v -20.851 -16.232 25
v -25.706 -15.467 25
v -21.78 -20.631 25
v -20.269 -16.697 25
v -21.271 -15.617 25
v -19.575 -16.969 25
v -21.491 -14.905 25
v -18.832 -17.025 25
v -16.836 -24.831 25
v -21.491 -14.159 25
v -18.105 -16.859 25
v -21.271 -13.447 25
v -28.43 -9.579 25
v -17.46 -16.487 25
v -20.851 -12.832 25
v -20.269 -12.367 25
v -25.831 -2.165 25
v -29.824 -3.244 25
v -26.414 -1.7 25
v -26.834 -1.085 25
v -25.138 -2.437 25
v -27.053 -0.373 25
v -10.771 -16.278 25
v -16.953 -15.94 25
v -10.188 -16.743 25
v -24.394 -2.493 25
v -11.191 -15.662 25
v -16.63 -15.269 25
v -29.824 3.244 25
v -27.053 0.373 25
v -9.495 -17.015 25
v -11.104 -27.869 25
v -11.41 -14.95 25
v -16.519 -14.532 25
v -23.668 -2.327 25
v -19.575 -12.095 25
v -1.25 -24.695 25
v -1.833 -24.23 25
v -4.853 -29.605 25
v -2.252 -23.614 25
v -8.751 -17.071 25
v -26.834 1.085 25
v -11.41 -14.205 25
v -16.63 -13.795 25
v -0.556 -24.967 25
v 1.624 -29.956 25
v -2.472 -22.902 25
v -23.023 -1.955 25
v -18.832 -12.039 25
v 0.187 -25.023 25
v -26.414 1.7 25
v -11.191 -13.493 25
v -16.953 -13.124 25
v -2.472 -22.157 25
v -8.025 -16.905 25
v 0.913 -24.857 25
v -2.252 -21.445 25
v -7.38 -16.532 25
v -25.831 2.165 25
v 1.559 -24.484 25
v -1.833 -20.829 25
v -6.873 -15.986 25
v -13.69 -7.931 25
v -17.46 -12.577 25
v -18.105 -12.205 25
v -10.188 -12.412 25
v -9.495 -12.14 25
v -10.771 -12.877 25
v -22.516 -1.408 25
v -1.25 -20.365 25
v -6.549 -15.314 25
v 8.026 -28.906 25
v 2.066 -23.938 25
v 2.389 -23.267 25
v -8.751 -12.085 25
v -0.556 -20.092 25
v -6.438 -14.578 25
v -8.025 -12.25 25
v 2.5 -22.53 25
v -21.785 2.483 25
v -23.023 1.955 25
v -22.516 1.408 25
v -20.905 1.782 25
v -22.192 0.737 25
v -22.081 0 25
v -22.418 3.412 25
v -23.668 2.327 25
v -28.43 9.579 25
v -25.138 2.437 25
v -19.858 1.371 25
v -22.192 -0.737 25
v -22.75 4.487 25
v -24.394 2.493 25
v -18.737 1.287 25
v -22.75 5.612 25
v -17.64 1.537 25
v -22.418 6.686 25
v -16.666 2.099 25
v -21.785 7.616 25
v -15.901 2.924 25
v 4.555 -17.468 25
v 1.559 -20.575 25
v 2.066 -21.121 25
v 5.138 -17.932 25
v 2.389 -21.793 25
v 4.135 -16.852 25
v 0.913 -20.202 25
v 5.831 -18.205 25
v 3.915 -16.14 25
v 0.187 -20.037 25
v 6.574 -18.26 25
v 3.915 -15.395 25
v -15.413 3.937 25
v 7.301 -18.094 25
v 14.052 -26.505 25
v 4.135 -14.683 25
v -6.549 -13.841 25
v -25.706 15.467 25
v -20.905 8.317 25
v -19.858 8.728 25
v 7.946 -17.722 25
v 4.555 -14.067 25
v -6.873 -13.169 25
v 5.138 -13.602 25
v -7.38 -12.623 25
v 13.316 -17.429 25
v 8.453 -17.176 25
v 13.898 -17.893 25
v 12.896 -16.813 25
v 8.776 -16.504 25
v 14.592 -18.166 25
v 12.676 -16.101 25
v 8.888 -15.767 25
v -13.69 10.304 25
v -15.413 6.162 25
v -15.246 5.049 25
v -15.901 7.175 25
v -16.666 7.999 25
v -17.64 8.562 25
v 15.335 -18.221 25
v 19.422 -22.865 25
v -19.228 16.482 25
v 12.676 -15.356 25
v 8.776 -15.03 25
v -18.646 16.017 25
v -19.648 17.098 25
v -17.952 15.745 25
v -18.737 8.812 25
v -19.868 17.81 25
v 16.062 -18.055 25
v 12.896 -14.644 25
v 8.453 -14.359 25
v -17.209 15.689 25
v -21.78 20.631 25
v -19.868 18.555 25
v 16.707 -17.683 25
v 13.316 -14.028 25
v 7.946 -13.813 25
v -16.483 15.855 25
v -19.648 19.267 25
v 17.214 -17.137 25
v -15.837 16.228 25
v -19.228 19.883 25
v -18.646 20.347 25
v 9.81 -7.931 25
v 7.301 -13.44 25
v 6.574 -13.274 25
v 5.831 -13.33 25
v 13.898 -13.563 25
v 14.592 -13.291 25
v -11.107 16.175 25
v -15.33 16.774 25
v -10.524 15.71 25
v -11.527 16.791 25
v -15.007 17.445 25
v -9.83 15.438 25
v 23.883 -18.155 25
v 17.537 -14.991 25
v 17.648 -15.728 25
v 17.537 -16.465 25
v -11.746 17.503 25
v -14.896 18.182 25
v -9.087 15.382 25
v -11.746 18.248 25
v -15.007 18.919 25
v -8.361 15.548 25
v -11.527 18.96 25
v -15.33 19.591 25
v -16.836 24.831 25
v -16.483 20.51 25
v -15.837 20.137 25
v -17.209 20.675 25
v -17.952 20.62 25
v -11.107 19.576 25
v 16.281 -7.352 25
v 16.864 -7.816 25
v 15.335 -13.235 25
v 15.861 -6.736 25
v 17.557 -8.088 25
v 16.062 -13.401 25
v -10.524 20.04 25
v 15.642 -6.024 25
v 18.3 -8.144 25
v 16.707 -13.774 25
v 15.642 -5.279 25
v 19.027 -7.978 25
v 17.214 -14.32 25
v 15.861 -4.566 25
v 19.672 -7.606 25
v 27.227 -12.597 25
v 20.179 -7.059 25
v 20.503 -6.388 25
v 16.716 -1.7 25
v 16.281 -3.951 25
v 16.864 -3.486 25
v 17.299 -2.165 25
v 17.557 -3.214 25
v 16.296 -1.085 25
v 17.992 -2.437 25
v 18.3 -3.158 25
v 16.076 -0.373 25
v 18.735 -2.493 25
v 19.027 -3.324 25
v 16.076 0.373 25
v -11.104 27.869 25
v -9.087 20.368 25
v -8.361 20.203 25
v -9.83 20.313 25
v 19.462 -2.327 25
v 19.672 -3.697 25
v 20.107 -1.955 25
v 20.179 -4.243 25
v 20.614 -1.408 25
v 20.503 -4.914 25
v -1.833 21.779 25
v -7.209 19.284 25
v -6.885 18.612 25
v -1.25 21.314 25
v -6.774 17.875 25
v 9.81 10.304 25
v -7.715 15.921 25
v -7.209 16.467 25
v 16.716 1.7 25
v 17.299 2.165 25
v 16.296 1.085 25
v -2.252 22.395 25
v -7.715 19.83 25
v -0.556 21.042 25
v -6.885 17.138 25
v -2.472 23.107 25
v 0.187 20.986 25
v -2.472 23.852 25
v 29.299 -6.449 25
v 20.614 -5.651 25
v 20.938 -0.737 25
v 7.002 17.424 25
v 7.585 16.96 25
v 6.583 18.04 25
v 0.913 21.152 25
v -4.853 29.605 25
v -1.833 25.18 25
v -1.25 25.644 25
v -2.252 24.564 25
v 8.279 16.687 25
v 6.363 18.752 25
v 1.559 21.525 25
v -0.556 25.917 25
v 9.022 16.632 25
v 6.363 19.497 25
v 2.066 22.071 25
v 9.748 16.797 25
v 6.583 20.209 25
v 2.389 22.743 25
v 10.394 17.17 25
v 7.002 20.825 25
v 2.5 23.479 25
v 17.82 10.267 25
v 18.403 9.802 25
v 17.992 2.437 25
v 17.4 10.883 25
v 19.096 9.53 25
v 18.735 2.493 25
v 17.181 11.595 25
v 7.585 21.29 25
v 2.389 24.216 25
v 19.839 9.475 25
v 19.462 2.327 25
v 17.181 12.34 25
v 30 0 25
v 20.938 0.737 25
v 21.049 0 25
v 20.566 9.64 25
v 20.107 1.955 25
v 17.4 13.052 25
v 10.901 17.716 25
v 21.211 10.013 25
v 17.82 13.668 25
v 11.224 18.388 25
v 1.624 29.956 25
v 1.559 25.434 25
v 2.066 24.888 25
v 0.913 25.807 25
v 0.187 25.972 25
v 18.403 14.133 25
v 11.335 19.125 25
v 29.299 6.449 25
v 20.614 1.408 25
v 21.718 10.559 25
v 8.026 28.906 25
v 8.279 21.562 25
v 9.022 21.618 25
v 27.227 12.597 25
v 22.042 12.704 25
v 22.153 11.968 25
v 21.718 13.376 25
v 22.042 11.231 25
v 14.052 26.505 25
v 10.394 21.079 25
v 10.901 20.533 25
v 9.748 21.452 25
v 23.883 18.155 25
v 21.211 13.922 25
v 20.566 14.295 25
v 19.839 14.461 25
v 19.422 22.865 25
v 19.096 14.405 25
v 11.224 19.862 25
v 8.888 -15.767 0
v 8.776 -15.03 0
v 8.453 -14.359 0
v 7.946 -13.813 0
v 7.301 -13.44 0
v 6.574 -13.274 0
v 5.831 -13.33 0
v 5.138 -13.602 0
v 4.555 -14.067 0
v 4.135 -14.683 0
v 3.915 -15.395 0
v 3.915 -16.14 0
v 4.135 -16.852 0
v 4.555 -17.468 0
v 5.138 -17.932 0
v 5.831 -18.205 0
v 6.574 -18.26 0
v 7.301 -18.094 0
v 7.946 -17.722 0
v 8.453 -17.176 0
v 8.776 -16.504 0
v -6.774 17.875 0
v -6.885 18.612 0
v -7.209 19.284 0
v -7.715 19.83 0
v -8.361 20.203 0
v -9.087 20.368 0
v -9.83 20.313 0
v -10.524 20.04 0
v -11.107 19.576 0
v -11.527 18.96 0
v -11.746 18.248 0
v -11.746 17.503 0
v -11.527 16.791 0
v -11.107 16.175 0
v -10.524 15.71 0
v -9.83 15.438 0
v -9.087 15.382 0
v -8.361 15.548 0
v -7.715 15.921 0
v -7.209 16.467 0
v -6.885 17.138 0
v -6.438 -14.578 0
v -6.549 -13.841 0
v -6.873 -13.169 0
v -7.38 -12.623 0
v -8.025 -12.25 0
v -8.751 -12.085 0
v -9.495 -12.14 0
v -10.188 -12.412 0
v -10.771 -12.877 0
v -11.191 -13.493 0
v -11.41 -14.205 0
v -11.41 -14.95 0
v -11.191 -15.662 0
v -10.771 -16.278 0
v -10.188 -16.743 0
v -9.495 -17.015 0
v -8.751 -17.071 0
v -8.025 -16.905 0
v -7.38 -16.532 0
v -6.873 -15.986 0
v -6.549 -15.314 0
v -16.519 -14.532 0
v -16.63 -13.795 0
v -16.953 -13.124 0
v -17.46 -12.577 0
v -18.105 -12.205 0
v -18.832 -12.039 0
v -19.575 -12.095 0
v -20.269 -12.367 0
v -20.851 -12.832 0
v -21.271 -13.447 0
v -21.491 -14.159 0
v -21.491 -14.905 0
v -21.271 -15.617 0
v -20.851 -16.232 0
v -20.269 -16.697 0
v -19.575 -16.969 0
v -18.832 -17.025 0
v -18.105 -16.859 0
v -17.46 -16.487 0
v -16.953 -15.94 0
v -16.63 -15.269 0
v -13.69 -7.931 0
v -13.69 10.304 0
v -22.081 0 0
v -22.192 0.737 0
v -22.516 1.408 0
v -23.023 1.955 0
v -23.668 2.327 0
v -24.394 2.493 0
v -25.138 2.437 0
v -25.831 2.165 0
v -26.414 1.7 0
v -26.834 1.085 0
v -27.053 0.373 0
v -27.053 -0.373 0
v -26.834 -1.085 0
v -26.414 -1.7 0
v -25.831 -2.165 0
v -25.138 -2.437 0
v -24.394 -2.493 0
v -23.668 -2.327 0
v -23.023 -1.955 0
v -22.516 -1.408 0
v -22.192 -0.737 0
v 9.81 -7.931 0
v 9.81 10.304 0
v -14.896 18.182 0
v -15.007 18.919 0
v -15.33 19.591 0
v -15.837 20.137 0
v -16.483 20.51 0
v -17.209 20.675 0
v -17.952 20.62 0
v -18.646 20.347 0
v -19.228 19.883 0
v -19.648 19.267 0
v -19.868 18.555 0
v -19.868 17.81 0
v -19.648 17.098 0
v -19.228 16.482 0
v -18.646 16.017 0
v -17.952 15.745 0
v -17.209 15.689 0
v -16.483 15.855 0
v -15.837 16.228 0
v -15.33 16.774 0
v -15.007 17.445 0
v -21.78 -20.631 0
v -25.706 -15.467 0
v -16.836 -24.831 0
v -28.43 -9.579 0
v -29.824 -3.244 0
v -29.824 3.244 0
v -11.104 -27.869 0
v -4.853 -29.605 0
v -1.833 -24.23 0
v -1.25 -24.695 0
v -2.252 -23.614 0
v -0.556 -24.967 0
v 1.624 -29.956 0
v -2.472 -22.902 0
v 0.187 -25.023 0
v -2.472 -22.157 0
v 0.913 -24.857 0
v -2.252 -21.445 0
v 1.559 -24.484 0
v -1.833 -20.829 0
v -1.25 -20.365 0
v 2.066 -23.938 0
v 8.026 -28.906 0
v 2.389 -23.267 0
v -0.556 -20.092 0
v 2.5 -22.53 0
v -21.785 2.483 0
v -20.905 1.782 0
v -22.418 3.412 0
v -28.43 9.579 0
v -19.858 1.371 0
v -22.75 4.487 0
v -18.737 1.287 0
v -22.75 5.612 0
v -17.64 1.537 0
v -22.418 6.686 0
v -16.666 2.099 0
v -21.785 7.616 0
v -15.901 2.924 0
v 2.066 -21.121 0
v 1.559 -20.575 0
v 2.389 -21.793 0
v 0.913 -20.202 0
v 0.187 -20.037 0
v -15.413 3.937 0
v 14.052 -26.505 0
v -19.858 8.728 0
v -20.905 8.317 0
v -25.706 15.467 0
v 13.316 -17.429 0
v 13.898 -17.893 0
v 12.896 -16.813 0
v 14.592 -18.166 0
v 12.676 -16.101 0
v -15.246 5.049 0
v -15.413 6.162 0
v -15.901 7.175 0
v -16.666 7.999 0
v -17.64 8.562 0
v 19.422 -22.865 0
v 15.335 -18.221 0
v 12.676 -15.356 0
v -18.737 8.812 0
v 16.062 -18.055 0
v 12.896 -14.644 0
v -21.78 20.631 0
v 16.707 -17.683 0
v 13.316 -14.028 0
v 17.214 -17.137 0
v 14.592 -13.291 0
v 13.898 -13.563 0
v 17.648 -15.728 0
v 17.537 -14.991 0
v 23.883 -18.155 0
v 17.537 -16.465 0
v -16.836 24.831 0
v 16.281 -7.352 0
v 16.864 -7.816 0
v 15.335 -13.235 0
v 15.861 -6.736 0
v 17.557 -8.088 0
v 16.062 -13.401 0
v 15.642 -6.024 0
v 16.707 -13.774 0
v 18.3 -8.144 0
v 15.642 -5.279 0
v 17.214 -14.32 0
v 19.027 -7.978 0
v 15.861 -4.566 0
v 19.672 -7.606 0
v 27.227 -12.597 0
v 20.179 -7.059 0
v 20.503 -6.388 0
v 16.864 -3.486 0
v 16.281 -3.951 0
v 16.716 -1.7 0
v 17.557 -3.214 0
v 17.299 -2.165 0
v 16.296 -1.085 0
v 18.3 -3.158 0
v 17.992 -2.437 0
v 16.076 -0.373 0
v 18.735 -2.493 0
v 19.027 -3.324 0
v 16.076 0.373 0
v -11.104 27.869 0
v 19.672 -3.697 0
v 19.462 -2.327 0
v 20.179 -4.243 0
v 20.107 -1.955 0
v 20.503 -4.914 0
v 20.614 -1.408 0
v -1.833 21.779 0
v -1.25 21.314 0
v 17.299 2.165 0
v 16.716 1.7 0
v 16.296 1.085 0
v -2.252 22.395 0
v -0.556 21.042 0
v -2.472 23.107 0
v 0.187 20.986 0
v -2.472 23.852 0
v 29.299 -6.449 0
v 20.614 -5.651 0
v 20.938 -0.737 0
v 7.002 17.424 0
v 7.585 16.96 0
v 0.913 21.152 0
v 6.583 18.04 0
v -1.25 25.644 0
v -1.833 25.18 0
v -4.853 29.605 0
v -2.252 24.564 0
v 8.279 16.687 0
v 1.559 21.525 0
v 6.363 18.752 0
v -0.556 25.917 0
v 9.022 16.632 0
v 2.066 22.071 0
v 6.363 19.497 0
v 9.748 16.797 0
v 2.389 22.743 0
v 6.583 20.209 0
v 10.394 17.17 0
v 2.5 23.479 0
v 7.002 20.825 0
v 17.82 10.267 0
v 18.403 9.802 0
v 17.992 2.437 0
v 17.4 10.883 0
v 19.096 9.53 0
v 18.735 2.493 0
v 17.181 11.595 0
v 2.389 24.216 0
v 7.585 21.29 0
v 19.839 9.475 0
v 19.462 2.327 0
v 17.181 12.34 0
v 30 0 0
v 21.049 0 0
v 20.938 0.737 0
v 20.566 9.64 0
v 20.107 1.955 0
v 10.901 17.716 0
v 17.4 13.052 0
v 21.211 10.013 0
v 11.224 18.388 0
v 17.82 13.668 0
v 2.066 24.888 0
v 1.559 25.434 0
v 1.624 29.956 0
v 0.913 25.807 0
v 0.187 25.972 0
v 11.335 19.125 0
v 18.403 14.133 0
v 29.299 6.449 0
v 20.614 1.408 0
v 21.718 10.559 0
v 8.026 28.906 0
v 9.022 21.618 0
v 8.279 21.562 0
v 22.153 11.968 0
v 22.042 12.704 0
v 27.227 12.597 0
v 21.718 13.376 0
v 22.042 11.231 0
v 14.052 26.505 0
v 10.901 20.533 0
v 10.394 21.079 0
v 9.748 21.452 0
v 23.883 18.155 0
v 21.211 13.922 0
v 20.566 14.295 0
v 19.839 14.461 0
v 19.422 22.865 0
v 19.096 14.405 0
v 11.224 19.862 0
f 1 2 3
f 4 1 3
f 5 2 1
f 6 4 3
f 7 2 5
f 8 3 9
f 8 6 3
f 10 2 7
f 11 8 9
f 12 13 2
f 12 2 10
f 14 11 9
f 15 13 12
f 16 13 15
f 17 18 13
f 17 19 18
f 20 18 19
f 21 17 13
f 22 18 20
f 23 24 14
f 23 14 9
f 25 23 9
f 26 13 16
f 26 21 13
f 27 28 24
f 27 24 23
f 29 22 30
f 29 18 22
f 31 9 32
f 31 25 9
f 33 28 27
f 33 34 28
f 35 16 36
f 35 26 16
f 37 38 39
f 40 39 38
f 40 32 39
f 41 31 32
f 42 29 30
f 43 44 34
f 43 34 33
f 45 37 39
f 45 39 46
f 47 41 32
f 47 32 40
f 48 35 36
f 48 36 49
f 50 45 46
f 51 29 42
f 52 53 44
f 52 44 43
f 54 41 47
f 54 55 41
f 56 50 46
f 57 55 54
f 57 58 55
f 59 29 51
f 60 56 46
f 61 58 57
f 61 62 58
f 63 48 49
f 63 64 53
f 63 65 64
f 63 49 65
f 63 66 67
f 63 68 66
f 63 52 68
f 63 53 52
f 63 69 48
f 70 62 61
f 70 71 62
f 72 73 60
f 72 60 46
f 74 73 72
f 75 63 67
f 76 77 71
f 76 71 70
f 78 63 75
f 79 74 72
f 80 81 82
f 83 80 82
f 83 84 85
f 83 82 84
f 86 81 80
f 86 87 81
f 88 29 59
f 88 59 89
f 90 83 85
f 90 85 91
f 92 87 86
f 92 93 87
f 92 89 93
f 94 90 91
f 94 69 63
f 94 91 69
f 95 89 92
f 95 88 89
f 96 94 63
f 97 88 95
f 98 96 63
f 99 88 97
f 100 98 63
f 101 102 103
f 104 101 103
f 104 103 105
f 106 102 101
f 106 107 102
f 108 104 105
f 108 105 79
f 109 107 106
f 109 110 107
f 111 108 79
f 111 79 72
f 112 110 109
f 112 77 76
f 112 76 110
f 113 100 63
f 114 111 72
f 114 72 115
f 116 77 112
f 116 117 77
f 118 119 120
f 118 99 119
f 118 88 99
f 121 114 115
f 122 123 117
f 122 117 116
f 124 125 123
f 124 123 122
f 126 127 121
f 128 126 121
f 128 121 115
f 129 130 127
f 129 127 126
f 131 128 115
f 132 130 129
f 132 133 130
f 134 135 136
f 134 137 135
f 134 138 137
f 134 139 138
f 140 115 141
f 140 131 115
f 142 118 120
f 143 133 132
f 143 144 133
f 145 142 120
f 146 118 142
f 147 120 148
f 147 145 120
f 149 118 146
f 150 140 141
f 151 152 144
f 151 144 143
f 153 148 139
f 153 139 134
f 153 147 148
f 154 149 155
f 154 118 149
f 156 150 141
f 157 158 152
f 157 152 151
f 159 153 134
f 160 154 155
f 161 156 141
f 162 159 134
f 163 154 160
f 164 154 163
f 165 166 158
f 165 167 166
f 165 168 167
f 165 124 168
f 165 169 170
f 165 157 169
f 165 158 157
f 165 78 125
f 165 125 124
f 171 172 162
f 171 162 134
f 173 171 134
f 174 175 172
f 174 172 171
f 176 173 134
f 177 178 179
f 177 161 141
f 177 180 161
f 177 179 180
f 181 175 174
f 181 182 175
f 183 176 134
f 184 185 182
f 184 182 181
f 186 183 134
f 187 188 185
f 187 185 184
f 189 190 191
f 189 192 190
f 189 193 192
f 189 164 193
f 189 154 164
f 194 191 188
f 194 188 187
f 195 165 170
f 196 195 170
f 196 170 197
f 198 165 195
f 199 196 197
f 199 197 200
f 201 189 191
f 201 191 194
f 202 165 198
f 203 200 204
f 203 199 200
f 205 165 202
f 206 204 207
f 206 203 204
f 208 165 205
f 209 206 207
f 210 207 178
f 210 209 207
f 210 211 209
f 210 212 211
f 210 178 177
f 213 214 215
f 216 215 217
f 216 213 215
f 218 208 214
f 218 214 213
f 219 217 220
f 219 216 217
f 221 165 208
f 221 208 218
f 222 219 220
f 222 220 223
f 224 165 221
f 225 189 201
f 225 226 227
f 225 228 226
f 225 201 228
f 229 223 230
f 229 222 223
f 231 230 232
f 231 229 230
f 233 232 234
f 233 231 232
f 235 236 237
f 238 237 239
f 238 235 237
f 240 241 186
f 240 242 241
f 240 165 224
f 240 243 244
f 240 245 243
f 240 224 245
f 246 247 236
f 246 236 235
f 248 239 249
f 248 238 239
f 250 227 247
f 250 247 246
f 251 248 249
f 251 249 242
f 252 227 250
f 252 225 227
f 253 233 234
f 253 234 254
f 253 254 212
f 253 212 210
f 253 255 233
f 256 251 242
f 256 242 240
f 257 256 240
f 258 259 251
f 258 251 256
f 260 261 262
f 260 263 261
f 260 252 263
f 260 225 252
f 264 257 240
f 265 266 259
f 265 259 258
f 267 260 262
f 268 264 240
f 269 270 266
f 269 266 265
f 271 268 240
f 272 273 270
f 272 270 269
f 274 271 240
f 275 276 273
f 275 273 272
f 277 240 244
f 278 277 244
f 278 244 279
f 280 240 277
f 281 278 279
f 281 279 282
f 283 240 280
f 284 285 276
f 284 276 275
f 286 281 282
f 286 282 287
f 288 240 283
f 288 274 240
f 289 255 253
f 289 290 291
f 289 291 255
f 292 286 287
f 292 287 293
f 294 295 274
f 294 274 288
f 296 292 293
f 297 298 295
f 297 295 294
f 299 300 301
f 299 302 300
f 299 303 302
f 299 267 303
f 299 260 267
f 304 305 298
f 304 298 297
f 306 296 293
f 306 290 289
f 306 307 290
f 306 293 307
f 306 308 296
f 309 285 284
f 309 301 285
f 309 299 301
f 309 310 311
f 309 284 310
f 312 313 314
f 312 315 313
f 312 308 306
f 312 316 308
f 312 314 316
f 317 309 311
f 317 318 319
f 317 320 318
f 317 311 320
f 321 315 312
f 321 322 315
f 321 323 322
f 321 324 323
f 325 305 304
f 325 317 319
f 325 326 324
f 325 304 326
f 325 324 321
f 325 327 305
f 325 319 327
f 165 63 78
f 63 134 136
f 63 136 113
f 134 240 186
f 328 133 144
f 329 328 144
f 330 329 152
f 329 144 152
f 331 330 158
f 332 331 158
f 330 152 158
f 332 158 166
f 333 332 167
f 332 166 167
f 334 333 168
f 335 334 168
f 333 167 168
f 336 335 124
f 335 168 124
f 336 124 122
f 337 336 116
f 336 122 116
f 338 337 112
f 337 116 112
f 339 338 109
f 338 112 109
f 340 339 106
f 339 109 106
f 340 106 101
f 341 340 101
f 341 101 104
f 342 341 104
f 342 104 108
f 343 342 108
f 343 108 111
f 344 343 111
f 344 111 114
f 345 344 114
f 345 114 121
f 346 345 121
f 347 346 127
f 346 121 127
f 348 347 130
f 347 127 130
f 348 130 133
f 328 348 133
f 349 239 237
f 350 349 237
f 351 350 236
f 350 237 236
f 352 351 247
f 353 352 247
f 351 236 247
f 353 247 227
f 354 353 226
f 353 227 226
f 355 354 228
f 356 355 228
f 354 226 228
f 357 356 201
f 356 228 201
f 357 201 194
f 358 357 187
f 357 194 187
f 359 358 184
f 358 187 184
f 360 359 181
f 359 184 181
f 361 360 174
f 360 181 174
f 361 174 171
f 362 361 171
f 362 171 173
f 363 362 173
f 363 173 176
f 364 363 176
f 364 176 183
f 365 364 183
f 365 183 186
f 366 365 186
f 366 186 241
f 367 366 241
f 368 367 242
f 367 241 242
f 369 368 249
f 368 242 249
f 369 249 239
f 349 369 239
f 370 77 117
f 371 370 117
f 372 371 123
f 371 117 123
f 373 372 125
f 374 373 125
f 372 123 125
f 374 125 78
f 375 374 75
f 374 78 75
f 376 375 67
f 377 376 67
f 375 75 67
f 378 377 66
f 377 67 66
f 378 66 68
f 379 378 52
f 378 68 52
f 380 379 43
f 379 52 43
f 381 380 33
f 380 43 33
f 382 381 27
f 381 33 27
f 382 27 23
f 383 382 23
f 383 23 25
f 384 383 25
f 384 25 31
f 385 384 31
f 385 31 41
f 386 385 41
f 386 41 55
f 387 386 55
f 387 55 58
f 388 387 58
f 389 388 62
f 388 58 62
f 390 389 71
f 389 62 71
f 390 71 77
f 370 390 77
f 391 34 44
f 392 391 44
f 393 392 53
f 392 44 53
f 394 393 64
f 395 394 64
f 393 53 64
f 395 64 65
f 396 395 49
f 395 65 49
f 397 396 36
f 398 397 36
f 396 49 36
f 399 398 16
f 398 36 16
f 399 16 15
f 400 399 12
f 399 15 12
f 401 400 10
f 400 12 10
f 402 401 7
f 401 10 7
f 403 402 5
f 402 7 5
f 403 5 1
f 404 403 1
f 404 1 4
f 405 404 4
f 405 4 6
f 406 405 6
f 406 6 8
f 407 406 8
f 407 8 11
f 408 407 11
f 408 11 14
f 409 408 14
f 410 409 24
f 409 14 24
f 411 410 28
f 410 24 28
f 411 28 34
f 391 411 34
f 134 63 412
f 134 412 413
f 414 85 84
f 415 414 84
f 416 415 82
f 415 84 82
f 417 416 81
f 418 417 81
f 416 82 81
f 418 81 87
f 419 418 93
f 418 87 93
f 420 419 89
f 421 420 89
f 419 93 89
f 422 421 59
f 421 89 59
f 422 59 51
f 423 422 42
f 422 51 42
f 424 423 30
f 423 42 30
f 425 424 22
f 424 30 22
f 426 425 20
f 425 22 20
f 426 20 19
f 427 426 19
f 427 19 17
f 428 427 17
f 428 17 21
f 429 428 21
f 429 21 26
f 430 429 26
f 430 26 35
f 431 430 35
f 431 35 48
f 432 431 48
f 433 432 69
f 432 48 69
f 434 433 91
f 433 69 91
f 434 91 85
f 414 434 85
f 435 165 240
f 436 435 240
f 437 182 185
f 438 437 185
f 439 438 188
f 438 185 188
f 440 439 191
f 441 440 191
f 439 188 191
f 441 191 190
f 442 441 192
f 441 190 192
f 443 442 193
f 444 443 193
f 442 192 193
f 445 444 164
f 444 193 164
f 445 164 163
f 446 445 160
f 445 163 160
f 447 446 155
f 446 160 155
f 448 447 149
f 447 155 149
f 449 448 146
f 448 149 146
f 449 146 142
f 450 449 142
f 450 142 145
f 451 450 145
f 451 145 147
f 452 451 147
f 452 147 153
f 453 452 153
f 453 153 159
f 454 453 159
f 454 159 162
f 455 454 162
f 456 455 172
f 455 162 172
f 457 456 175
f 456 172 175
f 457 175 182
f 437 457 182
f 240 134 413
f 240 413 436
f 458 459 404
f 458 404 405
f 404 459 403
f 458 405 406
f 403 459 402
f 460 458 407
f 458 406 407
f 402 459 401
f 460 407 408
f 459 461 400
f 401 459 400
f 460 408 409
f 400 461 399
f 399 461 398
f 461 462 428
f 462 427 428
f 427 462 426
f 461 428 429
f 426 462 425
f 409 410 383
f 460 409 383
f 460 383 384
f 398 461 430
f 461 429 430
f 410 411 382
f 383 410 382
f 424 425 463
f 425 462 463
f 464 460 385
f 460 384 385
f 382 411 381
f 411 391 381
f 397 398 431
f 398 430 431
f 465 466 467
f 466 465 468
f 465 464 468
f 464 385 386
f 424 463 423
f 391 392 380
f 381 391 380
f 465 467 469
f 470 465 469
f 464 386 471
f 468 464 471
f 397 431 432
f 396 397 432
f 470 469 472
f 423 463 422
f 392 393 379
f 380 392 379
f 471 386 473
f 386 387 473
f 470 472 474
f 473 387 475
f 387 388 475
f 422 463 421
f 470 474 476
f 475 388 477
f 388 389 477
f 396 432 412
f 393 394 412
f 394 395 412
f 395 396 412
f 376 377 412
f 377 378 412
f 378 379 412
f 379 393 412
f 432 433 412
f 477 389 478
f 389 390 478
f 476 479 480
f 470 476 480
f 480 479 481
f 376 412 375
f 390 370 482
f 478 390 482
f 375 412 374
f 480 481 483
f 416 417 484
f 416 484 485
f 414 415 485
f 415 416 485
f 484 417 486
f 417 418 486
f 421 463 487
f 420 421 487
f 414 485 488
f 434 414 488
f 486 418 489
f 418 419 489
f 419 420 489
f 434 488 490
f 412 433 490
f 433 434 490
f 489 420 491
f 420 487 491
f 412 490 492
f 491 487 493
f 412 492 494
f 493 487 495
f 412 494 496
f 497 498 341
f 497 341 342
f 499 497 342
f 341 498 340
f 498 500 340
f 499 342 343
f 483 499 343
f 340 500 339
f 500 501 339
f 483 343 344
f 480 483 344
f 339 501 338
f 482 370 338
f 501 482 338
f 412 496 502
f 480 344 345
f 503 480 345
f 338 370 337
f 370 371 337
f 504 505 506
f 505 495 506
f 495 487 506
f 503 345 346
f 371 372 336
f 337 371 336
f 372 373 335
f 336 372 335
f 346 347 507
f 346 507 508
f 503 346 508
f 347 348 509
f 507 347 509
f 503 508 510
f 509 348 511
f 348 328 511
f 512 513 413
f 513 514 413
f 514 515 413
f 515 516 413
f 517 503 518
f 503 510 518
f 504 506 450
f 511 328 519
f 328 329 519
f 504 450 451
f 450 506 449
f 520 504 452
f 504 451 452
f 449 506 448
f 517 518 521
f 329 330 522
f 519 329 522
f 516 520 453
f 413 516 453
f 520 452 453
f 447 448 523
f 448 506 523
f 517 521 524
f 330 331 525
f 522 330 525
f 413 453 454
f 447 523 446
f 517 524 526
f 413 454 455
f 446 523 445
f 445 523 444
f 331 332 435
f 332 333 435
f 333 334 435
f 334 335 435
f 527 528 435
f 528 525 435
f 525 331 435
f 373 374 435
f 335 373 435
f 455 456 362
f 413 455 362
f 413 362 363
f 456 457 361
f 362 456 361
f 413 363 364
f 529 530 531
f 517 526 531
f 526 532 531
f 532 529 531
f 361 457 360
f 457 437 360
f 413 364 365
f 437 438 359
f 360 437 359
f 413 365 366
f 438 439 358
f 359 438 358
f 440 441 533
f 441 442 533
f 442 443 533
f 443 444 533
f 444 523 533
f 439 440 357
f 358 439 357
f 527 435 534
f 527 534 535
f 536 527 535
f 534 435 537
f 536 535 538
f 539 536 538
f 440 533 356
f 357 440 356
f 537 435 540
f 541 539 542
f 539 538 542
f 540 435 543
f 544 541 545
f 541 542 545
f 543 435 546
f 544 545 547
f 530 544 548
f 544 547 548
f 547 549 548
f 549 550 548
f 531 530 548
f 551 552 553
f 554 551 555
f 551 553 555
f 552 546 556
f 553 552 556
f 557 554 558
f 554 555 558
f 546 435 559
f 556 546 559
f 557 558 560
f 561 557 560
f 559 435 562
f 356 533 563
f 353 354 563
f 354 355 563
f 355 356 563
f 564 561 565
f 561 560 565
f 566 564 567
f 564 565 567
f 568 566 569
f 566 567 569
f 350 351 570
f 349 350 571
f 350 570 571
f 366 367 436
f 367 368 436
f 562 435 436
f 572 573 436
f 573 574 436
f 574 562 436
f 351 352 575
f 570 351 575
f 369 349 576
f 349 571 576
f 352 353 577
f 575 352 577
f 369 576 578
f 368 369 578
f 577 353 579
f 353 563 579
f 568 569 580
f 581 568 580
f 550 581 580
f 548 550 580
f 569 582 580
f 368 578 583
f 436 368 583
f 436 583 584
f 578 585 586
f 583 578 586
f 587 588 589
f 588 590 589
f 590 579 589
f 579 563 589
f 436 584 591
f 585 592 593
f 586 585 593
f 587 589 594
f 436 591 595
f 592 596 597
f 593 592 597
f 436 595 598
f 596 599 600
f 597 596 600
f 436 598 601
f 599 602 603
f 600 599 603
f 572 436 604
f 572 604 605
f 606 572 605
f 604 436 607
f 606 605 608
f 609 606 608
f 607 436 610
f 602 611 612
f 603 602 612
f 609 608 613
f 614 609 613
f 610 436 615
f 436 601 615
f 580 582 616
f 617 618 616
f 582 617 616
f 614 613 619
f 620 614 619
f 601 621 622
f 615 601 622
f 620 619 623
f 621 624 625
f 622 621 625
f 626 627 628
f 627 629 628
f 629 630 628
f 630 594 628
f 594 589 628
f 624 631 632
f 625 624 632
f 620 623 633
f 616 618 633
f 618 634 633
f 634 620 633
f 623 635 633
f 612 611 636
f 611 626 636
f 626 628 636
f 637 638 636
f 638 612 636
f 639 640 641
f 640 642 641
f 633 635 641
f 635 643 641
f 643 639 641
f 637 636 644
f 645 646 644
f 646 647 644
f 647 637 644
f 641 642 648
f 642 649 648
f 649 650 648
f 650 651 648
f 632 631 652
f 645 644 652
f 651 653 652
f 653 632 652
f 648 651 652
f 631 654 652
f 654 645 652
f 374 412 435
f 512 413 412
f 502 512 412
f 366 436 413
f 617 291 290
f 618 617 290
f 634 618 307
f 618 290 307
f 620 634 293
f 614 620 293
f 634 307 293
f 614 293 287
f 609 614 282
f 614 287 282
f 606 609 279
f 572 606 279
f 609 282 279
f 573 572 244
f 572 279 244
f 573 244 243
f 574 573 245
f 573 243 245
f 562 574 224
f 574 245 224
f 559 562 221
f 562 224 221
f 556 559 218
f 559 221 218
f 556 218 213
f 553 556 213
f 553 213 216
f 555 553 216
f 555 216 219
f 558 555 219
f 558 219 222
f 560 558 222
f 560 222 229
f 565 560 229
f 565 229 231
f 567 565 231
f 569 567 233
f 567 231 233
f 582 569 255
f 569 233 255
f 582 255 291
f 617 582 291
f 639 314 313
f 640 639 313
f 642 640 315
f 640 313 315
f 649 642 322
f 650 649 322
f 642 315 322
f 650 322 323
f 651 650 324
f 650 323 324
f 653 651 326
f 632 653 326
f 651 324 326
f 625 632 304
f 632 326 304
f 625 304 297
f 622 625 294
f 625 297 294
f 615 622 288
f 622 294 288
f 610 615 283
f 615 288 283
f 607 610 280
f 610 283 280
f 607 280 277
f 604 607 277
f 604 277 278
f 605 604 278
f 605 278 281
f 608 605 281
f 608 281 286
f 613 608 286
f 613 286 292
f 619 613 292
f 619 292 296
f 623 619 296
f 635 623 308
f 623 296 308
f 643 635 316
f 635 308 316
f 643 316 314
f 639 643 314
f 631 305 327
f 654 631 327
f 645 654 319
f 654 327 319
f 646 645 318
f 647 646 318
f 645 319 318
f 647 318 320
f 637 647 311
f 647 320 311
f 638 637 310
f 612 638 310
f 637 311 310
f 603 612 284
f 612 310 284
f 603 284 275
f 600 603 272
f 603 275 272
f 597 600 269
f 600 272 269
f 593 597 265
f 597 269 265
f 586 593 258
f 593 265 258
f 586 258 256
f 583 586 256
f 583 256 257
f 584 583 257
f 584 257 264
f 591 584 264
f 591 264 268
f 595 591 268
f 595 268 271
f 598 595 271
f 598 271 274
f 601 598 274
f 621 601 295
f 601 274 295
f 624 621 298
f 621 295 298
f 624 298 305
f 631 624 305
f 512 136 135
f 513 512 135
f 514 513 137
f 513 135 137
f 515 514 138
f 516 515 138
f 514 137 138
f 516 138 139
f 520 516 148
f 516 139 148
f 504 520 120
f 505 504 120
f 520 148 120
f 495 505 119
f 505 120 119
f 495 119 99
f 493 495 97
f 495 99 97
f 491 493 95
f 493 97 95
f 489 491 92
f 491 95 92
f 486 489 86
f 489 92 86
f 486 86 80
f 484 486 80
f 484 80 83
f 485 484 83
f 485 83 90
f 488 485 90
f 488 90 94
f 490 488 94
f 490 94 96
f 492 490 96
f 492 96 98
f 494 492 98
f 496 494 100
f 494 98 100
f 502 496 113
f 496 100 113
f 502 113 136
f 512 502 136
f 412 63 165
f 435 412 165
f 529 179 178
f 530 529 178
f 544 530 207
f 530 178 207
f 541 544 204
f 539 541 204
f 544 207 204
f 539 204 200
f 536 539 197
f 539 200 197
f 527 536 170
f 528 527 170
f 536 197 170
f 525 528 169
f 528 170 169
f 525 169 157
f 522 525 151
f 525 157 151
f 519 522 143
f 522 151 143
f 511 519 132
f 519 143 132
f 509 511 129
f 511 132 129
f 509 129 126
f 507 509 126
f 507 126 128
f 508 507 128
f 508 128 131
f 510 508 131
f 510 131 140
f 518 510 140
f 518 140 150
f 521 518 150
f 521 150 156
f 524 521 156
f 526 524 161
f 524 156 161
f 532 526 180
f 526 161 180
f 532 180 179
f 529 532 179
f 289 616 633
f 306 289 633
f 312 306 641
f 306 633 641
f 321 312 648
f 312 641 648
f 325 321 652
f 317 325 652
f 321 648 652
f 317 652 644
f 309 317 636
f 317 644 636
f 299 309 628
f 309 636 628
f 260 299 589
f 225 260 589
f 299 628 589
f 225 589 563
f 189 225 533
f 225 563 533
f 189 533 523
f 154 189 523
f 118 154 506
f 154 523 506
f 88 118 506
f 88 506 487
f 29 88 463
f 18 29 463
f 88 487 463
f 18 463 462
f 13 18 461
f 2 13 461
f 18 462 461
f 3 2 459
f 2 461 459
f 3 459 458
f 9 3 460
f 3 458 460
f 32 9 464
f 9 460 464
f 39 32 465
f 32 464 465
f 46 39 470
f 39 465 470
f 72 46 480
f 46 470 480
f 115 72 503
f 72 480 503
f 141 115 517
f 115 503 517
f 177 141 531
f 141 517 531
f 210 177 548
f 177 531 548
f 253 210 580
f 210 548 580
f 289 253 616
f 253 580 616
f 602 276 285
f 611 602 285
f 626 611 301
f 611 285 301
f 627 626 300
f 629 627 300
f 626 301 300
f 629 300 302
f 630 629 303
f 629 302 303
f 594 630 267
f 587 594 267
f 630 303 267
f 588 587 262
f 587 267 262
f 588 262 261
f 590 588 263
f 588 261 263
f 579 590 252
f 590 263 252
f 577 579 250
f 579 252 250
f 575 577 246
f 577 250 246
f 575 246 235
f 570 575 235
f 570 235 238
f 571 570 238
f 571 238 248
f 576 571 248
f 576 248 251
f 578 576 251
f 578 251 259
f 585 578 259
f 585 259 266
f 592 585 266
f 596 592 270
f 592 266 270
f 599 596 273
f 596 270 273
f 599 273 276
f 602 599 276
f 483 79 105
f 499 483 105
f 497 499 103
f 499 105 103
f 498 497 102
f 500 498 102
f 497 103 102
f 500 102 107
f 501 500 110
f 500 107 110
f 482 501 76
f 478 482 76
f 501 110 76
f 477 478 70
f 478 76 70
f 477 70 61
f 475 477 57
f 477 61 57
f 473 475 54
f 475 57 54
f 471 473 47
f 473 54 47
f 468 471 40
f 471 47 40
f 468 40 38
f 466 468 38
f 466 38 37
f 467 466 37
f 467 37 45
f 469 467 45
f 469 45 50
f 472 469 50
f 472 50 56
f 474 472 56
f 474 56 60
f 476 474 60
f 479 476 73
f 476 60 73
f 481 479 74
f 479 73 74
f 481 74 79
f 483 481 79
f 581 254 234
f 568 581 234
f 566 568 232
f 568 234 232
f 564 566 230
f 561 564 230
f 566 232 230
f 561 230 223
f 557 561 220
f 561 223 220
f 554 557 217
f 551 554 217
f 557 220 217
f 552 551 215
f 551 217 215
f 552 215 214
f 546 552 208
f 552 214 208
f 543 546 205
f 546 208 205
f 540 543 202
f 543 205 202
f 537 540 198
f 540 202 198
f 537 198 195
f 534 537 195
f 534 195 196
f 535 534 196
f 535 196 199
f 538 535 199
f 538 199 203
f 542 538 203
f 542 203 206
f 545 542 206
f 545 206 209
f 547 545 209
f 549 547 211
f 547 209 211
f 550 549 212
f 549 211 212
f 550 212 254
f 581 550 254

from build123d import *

# Parameters (mm, degrees)
F0_R      = 30
F1_DEPTH  = 25
F2_W      = 23.500042
F2_H      = 18.234876
F3_DEPTH  = 15
F4_DEPTH  = 25
F5_R      = 2.5
F5_R_2    = 3.773073
F6_DEPTH  = 25
F7_R      = 2.5
F8_DEPTH  = 25
F9_R      = 2.5
F10_DEPTH = 25
F11_R     = 2.5
F12_DEPTH = 25


with BuildPart() as f1:
    # F0 (on Top) → F1 (new body)
    with BuildSketch(Plane.XY):
        Circle(F0_R)
    extrude(amount=F1_DEPTH)

    # F2 (on face) → F3 (join)
    with BuildSketch(Plane.XY.offset(25)):
        with Locations((-1.940479, 1.186641)):
            Rectangle(F2_W, F2_H)
    extrude(amount=-F3_DEPTH)

    # F2 (on face) → F4 (cut)
    with BuildSketch(Plane.XY.offset(25)):
        with Locations((-1.940479, 1.186641)):
            Rectangle(F2_W, F2_H)
    extrude(amount=-F4_DEPTH, mode=Mode.SUBTRACT)

    # F5 (on face) → F6 (cut)
    with BuildSketch(Plane.XY.offset(25)):
        with Locations((0, -22.529673)):
            Circle(F5_R)
        with Locations((18.548569, 0)):
            Circle(F5_R)
        with Locations((8.835036, 19.124642)):
            Circle(F5_R)
        with Locations((-19.018844, -14.531934)):
            Circle(F5_R)
        with Locations((-19.018844, 5.049379)):
            Circle(F5_R_2)
    extrude(amount=-F6_DEPTH, mode=Mode.SUBTRACT)

    # F7 (on face) → F8 (cut)
    with BuildSketch(Plane.XY.offset(25)):
        with Locations((-9.274186, 17.875323)):
            Circle(F7_R)
        with Locations((0, 23.479404)):
            Circle(F7_R)
        with Locations((15.148347, -15.728295)):
            Circle(F7_R)
    extrude(amount=-F8_DEPTH, mode=Mode.SUBTRACT)

    # F9 (on face) → F10 (cut)
    with BuildSketch(Plane.XY.offset(25)):
        with Locations((-8.938282, -14.577557)):
            Circle(F9_R)
        with Locations((19.652629, 11.967526)):
            Circle(F9_R)
        with Locations((6.387524, -15.767302)):
            Circle(F9_R)
        with Locations((-24.581272, 0)):
            Circle(F9_R)
        with Locations((-17.395867, 18.182352)):
            Circle(F9_R)
    extrude(amount=-F10_DEPTH, mode=Mode.SUBTRACT)

    # F11 (on face) → F12 (cut)
    with BuildSketch(Plane.XY.offset(25)):
        with Locations((18.113662, -5.651171)):
            Circle(F11_R)
    extrude(amount=-F12_DEPTH, mode=Mode.SUBTRACT)


solid = f1.part
